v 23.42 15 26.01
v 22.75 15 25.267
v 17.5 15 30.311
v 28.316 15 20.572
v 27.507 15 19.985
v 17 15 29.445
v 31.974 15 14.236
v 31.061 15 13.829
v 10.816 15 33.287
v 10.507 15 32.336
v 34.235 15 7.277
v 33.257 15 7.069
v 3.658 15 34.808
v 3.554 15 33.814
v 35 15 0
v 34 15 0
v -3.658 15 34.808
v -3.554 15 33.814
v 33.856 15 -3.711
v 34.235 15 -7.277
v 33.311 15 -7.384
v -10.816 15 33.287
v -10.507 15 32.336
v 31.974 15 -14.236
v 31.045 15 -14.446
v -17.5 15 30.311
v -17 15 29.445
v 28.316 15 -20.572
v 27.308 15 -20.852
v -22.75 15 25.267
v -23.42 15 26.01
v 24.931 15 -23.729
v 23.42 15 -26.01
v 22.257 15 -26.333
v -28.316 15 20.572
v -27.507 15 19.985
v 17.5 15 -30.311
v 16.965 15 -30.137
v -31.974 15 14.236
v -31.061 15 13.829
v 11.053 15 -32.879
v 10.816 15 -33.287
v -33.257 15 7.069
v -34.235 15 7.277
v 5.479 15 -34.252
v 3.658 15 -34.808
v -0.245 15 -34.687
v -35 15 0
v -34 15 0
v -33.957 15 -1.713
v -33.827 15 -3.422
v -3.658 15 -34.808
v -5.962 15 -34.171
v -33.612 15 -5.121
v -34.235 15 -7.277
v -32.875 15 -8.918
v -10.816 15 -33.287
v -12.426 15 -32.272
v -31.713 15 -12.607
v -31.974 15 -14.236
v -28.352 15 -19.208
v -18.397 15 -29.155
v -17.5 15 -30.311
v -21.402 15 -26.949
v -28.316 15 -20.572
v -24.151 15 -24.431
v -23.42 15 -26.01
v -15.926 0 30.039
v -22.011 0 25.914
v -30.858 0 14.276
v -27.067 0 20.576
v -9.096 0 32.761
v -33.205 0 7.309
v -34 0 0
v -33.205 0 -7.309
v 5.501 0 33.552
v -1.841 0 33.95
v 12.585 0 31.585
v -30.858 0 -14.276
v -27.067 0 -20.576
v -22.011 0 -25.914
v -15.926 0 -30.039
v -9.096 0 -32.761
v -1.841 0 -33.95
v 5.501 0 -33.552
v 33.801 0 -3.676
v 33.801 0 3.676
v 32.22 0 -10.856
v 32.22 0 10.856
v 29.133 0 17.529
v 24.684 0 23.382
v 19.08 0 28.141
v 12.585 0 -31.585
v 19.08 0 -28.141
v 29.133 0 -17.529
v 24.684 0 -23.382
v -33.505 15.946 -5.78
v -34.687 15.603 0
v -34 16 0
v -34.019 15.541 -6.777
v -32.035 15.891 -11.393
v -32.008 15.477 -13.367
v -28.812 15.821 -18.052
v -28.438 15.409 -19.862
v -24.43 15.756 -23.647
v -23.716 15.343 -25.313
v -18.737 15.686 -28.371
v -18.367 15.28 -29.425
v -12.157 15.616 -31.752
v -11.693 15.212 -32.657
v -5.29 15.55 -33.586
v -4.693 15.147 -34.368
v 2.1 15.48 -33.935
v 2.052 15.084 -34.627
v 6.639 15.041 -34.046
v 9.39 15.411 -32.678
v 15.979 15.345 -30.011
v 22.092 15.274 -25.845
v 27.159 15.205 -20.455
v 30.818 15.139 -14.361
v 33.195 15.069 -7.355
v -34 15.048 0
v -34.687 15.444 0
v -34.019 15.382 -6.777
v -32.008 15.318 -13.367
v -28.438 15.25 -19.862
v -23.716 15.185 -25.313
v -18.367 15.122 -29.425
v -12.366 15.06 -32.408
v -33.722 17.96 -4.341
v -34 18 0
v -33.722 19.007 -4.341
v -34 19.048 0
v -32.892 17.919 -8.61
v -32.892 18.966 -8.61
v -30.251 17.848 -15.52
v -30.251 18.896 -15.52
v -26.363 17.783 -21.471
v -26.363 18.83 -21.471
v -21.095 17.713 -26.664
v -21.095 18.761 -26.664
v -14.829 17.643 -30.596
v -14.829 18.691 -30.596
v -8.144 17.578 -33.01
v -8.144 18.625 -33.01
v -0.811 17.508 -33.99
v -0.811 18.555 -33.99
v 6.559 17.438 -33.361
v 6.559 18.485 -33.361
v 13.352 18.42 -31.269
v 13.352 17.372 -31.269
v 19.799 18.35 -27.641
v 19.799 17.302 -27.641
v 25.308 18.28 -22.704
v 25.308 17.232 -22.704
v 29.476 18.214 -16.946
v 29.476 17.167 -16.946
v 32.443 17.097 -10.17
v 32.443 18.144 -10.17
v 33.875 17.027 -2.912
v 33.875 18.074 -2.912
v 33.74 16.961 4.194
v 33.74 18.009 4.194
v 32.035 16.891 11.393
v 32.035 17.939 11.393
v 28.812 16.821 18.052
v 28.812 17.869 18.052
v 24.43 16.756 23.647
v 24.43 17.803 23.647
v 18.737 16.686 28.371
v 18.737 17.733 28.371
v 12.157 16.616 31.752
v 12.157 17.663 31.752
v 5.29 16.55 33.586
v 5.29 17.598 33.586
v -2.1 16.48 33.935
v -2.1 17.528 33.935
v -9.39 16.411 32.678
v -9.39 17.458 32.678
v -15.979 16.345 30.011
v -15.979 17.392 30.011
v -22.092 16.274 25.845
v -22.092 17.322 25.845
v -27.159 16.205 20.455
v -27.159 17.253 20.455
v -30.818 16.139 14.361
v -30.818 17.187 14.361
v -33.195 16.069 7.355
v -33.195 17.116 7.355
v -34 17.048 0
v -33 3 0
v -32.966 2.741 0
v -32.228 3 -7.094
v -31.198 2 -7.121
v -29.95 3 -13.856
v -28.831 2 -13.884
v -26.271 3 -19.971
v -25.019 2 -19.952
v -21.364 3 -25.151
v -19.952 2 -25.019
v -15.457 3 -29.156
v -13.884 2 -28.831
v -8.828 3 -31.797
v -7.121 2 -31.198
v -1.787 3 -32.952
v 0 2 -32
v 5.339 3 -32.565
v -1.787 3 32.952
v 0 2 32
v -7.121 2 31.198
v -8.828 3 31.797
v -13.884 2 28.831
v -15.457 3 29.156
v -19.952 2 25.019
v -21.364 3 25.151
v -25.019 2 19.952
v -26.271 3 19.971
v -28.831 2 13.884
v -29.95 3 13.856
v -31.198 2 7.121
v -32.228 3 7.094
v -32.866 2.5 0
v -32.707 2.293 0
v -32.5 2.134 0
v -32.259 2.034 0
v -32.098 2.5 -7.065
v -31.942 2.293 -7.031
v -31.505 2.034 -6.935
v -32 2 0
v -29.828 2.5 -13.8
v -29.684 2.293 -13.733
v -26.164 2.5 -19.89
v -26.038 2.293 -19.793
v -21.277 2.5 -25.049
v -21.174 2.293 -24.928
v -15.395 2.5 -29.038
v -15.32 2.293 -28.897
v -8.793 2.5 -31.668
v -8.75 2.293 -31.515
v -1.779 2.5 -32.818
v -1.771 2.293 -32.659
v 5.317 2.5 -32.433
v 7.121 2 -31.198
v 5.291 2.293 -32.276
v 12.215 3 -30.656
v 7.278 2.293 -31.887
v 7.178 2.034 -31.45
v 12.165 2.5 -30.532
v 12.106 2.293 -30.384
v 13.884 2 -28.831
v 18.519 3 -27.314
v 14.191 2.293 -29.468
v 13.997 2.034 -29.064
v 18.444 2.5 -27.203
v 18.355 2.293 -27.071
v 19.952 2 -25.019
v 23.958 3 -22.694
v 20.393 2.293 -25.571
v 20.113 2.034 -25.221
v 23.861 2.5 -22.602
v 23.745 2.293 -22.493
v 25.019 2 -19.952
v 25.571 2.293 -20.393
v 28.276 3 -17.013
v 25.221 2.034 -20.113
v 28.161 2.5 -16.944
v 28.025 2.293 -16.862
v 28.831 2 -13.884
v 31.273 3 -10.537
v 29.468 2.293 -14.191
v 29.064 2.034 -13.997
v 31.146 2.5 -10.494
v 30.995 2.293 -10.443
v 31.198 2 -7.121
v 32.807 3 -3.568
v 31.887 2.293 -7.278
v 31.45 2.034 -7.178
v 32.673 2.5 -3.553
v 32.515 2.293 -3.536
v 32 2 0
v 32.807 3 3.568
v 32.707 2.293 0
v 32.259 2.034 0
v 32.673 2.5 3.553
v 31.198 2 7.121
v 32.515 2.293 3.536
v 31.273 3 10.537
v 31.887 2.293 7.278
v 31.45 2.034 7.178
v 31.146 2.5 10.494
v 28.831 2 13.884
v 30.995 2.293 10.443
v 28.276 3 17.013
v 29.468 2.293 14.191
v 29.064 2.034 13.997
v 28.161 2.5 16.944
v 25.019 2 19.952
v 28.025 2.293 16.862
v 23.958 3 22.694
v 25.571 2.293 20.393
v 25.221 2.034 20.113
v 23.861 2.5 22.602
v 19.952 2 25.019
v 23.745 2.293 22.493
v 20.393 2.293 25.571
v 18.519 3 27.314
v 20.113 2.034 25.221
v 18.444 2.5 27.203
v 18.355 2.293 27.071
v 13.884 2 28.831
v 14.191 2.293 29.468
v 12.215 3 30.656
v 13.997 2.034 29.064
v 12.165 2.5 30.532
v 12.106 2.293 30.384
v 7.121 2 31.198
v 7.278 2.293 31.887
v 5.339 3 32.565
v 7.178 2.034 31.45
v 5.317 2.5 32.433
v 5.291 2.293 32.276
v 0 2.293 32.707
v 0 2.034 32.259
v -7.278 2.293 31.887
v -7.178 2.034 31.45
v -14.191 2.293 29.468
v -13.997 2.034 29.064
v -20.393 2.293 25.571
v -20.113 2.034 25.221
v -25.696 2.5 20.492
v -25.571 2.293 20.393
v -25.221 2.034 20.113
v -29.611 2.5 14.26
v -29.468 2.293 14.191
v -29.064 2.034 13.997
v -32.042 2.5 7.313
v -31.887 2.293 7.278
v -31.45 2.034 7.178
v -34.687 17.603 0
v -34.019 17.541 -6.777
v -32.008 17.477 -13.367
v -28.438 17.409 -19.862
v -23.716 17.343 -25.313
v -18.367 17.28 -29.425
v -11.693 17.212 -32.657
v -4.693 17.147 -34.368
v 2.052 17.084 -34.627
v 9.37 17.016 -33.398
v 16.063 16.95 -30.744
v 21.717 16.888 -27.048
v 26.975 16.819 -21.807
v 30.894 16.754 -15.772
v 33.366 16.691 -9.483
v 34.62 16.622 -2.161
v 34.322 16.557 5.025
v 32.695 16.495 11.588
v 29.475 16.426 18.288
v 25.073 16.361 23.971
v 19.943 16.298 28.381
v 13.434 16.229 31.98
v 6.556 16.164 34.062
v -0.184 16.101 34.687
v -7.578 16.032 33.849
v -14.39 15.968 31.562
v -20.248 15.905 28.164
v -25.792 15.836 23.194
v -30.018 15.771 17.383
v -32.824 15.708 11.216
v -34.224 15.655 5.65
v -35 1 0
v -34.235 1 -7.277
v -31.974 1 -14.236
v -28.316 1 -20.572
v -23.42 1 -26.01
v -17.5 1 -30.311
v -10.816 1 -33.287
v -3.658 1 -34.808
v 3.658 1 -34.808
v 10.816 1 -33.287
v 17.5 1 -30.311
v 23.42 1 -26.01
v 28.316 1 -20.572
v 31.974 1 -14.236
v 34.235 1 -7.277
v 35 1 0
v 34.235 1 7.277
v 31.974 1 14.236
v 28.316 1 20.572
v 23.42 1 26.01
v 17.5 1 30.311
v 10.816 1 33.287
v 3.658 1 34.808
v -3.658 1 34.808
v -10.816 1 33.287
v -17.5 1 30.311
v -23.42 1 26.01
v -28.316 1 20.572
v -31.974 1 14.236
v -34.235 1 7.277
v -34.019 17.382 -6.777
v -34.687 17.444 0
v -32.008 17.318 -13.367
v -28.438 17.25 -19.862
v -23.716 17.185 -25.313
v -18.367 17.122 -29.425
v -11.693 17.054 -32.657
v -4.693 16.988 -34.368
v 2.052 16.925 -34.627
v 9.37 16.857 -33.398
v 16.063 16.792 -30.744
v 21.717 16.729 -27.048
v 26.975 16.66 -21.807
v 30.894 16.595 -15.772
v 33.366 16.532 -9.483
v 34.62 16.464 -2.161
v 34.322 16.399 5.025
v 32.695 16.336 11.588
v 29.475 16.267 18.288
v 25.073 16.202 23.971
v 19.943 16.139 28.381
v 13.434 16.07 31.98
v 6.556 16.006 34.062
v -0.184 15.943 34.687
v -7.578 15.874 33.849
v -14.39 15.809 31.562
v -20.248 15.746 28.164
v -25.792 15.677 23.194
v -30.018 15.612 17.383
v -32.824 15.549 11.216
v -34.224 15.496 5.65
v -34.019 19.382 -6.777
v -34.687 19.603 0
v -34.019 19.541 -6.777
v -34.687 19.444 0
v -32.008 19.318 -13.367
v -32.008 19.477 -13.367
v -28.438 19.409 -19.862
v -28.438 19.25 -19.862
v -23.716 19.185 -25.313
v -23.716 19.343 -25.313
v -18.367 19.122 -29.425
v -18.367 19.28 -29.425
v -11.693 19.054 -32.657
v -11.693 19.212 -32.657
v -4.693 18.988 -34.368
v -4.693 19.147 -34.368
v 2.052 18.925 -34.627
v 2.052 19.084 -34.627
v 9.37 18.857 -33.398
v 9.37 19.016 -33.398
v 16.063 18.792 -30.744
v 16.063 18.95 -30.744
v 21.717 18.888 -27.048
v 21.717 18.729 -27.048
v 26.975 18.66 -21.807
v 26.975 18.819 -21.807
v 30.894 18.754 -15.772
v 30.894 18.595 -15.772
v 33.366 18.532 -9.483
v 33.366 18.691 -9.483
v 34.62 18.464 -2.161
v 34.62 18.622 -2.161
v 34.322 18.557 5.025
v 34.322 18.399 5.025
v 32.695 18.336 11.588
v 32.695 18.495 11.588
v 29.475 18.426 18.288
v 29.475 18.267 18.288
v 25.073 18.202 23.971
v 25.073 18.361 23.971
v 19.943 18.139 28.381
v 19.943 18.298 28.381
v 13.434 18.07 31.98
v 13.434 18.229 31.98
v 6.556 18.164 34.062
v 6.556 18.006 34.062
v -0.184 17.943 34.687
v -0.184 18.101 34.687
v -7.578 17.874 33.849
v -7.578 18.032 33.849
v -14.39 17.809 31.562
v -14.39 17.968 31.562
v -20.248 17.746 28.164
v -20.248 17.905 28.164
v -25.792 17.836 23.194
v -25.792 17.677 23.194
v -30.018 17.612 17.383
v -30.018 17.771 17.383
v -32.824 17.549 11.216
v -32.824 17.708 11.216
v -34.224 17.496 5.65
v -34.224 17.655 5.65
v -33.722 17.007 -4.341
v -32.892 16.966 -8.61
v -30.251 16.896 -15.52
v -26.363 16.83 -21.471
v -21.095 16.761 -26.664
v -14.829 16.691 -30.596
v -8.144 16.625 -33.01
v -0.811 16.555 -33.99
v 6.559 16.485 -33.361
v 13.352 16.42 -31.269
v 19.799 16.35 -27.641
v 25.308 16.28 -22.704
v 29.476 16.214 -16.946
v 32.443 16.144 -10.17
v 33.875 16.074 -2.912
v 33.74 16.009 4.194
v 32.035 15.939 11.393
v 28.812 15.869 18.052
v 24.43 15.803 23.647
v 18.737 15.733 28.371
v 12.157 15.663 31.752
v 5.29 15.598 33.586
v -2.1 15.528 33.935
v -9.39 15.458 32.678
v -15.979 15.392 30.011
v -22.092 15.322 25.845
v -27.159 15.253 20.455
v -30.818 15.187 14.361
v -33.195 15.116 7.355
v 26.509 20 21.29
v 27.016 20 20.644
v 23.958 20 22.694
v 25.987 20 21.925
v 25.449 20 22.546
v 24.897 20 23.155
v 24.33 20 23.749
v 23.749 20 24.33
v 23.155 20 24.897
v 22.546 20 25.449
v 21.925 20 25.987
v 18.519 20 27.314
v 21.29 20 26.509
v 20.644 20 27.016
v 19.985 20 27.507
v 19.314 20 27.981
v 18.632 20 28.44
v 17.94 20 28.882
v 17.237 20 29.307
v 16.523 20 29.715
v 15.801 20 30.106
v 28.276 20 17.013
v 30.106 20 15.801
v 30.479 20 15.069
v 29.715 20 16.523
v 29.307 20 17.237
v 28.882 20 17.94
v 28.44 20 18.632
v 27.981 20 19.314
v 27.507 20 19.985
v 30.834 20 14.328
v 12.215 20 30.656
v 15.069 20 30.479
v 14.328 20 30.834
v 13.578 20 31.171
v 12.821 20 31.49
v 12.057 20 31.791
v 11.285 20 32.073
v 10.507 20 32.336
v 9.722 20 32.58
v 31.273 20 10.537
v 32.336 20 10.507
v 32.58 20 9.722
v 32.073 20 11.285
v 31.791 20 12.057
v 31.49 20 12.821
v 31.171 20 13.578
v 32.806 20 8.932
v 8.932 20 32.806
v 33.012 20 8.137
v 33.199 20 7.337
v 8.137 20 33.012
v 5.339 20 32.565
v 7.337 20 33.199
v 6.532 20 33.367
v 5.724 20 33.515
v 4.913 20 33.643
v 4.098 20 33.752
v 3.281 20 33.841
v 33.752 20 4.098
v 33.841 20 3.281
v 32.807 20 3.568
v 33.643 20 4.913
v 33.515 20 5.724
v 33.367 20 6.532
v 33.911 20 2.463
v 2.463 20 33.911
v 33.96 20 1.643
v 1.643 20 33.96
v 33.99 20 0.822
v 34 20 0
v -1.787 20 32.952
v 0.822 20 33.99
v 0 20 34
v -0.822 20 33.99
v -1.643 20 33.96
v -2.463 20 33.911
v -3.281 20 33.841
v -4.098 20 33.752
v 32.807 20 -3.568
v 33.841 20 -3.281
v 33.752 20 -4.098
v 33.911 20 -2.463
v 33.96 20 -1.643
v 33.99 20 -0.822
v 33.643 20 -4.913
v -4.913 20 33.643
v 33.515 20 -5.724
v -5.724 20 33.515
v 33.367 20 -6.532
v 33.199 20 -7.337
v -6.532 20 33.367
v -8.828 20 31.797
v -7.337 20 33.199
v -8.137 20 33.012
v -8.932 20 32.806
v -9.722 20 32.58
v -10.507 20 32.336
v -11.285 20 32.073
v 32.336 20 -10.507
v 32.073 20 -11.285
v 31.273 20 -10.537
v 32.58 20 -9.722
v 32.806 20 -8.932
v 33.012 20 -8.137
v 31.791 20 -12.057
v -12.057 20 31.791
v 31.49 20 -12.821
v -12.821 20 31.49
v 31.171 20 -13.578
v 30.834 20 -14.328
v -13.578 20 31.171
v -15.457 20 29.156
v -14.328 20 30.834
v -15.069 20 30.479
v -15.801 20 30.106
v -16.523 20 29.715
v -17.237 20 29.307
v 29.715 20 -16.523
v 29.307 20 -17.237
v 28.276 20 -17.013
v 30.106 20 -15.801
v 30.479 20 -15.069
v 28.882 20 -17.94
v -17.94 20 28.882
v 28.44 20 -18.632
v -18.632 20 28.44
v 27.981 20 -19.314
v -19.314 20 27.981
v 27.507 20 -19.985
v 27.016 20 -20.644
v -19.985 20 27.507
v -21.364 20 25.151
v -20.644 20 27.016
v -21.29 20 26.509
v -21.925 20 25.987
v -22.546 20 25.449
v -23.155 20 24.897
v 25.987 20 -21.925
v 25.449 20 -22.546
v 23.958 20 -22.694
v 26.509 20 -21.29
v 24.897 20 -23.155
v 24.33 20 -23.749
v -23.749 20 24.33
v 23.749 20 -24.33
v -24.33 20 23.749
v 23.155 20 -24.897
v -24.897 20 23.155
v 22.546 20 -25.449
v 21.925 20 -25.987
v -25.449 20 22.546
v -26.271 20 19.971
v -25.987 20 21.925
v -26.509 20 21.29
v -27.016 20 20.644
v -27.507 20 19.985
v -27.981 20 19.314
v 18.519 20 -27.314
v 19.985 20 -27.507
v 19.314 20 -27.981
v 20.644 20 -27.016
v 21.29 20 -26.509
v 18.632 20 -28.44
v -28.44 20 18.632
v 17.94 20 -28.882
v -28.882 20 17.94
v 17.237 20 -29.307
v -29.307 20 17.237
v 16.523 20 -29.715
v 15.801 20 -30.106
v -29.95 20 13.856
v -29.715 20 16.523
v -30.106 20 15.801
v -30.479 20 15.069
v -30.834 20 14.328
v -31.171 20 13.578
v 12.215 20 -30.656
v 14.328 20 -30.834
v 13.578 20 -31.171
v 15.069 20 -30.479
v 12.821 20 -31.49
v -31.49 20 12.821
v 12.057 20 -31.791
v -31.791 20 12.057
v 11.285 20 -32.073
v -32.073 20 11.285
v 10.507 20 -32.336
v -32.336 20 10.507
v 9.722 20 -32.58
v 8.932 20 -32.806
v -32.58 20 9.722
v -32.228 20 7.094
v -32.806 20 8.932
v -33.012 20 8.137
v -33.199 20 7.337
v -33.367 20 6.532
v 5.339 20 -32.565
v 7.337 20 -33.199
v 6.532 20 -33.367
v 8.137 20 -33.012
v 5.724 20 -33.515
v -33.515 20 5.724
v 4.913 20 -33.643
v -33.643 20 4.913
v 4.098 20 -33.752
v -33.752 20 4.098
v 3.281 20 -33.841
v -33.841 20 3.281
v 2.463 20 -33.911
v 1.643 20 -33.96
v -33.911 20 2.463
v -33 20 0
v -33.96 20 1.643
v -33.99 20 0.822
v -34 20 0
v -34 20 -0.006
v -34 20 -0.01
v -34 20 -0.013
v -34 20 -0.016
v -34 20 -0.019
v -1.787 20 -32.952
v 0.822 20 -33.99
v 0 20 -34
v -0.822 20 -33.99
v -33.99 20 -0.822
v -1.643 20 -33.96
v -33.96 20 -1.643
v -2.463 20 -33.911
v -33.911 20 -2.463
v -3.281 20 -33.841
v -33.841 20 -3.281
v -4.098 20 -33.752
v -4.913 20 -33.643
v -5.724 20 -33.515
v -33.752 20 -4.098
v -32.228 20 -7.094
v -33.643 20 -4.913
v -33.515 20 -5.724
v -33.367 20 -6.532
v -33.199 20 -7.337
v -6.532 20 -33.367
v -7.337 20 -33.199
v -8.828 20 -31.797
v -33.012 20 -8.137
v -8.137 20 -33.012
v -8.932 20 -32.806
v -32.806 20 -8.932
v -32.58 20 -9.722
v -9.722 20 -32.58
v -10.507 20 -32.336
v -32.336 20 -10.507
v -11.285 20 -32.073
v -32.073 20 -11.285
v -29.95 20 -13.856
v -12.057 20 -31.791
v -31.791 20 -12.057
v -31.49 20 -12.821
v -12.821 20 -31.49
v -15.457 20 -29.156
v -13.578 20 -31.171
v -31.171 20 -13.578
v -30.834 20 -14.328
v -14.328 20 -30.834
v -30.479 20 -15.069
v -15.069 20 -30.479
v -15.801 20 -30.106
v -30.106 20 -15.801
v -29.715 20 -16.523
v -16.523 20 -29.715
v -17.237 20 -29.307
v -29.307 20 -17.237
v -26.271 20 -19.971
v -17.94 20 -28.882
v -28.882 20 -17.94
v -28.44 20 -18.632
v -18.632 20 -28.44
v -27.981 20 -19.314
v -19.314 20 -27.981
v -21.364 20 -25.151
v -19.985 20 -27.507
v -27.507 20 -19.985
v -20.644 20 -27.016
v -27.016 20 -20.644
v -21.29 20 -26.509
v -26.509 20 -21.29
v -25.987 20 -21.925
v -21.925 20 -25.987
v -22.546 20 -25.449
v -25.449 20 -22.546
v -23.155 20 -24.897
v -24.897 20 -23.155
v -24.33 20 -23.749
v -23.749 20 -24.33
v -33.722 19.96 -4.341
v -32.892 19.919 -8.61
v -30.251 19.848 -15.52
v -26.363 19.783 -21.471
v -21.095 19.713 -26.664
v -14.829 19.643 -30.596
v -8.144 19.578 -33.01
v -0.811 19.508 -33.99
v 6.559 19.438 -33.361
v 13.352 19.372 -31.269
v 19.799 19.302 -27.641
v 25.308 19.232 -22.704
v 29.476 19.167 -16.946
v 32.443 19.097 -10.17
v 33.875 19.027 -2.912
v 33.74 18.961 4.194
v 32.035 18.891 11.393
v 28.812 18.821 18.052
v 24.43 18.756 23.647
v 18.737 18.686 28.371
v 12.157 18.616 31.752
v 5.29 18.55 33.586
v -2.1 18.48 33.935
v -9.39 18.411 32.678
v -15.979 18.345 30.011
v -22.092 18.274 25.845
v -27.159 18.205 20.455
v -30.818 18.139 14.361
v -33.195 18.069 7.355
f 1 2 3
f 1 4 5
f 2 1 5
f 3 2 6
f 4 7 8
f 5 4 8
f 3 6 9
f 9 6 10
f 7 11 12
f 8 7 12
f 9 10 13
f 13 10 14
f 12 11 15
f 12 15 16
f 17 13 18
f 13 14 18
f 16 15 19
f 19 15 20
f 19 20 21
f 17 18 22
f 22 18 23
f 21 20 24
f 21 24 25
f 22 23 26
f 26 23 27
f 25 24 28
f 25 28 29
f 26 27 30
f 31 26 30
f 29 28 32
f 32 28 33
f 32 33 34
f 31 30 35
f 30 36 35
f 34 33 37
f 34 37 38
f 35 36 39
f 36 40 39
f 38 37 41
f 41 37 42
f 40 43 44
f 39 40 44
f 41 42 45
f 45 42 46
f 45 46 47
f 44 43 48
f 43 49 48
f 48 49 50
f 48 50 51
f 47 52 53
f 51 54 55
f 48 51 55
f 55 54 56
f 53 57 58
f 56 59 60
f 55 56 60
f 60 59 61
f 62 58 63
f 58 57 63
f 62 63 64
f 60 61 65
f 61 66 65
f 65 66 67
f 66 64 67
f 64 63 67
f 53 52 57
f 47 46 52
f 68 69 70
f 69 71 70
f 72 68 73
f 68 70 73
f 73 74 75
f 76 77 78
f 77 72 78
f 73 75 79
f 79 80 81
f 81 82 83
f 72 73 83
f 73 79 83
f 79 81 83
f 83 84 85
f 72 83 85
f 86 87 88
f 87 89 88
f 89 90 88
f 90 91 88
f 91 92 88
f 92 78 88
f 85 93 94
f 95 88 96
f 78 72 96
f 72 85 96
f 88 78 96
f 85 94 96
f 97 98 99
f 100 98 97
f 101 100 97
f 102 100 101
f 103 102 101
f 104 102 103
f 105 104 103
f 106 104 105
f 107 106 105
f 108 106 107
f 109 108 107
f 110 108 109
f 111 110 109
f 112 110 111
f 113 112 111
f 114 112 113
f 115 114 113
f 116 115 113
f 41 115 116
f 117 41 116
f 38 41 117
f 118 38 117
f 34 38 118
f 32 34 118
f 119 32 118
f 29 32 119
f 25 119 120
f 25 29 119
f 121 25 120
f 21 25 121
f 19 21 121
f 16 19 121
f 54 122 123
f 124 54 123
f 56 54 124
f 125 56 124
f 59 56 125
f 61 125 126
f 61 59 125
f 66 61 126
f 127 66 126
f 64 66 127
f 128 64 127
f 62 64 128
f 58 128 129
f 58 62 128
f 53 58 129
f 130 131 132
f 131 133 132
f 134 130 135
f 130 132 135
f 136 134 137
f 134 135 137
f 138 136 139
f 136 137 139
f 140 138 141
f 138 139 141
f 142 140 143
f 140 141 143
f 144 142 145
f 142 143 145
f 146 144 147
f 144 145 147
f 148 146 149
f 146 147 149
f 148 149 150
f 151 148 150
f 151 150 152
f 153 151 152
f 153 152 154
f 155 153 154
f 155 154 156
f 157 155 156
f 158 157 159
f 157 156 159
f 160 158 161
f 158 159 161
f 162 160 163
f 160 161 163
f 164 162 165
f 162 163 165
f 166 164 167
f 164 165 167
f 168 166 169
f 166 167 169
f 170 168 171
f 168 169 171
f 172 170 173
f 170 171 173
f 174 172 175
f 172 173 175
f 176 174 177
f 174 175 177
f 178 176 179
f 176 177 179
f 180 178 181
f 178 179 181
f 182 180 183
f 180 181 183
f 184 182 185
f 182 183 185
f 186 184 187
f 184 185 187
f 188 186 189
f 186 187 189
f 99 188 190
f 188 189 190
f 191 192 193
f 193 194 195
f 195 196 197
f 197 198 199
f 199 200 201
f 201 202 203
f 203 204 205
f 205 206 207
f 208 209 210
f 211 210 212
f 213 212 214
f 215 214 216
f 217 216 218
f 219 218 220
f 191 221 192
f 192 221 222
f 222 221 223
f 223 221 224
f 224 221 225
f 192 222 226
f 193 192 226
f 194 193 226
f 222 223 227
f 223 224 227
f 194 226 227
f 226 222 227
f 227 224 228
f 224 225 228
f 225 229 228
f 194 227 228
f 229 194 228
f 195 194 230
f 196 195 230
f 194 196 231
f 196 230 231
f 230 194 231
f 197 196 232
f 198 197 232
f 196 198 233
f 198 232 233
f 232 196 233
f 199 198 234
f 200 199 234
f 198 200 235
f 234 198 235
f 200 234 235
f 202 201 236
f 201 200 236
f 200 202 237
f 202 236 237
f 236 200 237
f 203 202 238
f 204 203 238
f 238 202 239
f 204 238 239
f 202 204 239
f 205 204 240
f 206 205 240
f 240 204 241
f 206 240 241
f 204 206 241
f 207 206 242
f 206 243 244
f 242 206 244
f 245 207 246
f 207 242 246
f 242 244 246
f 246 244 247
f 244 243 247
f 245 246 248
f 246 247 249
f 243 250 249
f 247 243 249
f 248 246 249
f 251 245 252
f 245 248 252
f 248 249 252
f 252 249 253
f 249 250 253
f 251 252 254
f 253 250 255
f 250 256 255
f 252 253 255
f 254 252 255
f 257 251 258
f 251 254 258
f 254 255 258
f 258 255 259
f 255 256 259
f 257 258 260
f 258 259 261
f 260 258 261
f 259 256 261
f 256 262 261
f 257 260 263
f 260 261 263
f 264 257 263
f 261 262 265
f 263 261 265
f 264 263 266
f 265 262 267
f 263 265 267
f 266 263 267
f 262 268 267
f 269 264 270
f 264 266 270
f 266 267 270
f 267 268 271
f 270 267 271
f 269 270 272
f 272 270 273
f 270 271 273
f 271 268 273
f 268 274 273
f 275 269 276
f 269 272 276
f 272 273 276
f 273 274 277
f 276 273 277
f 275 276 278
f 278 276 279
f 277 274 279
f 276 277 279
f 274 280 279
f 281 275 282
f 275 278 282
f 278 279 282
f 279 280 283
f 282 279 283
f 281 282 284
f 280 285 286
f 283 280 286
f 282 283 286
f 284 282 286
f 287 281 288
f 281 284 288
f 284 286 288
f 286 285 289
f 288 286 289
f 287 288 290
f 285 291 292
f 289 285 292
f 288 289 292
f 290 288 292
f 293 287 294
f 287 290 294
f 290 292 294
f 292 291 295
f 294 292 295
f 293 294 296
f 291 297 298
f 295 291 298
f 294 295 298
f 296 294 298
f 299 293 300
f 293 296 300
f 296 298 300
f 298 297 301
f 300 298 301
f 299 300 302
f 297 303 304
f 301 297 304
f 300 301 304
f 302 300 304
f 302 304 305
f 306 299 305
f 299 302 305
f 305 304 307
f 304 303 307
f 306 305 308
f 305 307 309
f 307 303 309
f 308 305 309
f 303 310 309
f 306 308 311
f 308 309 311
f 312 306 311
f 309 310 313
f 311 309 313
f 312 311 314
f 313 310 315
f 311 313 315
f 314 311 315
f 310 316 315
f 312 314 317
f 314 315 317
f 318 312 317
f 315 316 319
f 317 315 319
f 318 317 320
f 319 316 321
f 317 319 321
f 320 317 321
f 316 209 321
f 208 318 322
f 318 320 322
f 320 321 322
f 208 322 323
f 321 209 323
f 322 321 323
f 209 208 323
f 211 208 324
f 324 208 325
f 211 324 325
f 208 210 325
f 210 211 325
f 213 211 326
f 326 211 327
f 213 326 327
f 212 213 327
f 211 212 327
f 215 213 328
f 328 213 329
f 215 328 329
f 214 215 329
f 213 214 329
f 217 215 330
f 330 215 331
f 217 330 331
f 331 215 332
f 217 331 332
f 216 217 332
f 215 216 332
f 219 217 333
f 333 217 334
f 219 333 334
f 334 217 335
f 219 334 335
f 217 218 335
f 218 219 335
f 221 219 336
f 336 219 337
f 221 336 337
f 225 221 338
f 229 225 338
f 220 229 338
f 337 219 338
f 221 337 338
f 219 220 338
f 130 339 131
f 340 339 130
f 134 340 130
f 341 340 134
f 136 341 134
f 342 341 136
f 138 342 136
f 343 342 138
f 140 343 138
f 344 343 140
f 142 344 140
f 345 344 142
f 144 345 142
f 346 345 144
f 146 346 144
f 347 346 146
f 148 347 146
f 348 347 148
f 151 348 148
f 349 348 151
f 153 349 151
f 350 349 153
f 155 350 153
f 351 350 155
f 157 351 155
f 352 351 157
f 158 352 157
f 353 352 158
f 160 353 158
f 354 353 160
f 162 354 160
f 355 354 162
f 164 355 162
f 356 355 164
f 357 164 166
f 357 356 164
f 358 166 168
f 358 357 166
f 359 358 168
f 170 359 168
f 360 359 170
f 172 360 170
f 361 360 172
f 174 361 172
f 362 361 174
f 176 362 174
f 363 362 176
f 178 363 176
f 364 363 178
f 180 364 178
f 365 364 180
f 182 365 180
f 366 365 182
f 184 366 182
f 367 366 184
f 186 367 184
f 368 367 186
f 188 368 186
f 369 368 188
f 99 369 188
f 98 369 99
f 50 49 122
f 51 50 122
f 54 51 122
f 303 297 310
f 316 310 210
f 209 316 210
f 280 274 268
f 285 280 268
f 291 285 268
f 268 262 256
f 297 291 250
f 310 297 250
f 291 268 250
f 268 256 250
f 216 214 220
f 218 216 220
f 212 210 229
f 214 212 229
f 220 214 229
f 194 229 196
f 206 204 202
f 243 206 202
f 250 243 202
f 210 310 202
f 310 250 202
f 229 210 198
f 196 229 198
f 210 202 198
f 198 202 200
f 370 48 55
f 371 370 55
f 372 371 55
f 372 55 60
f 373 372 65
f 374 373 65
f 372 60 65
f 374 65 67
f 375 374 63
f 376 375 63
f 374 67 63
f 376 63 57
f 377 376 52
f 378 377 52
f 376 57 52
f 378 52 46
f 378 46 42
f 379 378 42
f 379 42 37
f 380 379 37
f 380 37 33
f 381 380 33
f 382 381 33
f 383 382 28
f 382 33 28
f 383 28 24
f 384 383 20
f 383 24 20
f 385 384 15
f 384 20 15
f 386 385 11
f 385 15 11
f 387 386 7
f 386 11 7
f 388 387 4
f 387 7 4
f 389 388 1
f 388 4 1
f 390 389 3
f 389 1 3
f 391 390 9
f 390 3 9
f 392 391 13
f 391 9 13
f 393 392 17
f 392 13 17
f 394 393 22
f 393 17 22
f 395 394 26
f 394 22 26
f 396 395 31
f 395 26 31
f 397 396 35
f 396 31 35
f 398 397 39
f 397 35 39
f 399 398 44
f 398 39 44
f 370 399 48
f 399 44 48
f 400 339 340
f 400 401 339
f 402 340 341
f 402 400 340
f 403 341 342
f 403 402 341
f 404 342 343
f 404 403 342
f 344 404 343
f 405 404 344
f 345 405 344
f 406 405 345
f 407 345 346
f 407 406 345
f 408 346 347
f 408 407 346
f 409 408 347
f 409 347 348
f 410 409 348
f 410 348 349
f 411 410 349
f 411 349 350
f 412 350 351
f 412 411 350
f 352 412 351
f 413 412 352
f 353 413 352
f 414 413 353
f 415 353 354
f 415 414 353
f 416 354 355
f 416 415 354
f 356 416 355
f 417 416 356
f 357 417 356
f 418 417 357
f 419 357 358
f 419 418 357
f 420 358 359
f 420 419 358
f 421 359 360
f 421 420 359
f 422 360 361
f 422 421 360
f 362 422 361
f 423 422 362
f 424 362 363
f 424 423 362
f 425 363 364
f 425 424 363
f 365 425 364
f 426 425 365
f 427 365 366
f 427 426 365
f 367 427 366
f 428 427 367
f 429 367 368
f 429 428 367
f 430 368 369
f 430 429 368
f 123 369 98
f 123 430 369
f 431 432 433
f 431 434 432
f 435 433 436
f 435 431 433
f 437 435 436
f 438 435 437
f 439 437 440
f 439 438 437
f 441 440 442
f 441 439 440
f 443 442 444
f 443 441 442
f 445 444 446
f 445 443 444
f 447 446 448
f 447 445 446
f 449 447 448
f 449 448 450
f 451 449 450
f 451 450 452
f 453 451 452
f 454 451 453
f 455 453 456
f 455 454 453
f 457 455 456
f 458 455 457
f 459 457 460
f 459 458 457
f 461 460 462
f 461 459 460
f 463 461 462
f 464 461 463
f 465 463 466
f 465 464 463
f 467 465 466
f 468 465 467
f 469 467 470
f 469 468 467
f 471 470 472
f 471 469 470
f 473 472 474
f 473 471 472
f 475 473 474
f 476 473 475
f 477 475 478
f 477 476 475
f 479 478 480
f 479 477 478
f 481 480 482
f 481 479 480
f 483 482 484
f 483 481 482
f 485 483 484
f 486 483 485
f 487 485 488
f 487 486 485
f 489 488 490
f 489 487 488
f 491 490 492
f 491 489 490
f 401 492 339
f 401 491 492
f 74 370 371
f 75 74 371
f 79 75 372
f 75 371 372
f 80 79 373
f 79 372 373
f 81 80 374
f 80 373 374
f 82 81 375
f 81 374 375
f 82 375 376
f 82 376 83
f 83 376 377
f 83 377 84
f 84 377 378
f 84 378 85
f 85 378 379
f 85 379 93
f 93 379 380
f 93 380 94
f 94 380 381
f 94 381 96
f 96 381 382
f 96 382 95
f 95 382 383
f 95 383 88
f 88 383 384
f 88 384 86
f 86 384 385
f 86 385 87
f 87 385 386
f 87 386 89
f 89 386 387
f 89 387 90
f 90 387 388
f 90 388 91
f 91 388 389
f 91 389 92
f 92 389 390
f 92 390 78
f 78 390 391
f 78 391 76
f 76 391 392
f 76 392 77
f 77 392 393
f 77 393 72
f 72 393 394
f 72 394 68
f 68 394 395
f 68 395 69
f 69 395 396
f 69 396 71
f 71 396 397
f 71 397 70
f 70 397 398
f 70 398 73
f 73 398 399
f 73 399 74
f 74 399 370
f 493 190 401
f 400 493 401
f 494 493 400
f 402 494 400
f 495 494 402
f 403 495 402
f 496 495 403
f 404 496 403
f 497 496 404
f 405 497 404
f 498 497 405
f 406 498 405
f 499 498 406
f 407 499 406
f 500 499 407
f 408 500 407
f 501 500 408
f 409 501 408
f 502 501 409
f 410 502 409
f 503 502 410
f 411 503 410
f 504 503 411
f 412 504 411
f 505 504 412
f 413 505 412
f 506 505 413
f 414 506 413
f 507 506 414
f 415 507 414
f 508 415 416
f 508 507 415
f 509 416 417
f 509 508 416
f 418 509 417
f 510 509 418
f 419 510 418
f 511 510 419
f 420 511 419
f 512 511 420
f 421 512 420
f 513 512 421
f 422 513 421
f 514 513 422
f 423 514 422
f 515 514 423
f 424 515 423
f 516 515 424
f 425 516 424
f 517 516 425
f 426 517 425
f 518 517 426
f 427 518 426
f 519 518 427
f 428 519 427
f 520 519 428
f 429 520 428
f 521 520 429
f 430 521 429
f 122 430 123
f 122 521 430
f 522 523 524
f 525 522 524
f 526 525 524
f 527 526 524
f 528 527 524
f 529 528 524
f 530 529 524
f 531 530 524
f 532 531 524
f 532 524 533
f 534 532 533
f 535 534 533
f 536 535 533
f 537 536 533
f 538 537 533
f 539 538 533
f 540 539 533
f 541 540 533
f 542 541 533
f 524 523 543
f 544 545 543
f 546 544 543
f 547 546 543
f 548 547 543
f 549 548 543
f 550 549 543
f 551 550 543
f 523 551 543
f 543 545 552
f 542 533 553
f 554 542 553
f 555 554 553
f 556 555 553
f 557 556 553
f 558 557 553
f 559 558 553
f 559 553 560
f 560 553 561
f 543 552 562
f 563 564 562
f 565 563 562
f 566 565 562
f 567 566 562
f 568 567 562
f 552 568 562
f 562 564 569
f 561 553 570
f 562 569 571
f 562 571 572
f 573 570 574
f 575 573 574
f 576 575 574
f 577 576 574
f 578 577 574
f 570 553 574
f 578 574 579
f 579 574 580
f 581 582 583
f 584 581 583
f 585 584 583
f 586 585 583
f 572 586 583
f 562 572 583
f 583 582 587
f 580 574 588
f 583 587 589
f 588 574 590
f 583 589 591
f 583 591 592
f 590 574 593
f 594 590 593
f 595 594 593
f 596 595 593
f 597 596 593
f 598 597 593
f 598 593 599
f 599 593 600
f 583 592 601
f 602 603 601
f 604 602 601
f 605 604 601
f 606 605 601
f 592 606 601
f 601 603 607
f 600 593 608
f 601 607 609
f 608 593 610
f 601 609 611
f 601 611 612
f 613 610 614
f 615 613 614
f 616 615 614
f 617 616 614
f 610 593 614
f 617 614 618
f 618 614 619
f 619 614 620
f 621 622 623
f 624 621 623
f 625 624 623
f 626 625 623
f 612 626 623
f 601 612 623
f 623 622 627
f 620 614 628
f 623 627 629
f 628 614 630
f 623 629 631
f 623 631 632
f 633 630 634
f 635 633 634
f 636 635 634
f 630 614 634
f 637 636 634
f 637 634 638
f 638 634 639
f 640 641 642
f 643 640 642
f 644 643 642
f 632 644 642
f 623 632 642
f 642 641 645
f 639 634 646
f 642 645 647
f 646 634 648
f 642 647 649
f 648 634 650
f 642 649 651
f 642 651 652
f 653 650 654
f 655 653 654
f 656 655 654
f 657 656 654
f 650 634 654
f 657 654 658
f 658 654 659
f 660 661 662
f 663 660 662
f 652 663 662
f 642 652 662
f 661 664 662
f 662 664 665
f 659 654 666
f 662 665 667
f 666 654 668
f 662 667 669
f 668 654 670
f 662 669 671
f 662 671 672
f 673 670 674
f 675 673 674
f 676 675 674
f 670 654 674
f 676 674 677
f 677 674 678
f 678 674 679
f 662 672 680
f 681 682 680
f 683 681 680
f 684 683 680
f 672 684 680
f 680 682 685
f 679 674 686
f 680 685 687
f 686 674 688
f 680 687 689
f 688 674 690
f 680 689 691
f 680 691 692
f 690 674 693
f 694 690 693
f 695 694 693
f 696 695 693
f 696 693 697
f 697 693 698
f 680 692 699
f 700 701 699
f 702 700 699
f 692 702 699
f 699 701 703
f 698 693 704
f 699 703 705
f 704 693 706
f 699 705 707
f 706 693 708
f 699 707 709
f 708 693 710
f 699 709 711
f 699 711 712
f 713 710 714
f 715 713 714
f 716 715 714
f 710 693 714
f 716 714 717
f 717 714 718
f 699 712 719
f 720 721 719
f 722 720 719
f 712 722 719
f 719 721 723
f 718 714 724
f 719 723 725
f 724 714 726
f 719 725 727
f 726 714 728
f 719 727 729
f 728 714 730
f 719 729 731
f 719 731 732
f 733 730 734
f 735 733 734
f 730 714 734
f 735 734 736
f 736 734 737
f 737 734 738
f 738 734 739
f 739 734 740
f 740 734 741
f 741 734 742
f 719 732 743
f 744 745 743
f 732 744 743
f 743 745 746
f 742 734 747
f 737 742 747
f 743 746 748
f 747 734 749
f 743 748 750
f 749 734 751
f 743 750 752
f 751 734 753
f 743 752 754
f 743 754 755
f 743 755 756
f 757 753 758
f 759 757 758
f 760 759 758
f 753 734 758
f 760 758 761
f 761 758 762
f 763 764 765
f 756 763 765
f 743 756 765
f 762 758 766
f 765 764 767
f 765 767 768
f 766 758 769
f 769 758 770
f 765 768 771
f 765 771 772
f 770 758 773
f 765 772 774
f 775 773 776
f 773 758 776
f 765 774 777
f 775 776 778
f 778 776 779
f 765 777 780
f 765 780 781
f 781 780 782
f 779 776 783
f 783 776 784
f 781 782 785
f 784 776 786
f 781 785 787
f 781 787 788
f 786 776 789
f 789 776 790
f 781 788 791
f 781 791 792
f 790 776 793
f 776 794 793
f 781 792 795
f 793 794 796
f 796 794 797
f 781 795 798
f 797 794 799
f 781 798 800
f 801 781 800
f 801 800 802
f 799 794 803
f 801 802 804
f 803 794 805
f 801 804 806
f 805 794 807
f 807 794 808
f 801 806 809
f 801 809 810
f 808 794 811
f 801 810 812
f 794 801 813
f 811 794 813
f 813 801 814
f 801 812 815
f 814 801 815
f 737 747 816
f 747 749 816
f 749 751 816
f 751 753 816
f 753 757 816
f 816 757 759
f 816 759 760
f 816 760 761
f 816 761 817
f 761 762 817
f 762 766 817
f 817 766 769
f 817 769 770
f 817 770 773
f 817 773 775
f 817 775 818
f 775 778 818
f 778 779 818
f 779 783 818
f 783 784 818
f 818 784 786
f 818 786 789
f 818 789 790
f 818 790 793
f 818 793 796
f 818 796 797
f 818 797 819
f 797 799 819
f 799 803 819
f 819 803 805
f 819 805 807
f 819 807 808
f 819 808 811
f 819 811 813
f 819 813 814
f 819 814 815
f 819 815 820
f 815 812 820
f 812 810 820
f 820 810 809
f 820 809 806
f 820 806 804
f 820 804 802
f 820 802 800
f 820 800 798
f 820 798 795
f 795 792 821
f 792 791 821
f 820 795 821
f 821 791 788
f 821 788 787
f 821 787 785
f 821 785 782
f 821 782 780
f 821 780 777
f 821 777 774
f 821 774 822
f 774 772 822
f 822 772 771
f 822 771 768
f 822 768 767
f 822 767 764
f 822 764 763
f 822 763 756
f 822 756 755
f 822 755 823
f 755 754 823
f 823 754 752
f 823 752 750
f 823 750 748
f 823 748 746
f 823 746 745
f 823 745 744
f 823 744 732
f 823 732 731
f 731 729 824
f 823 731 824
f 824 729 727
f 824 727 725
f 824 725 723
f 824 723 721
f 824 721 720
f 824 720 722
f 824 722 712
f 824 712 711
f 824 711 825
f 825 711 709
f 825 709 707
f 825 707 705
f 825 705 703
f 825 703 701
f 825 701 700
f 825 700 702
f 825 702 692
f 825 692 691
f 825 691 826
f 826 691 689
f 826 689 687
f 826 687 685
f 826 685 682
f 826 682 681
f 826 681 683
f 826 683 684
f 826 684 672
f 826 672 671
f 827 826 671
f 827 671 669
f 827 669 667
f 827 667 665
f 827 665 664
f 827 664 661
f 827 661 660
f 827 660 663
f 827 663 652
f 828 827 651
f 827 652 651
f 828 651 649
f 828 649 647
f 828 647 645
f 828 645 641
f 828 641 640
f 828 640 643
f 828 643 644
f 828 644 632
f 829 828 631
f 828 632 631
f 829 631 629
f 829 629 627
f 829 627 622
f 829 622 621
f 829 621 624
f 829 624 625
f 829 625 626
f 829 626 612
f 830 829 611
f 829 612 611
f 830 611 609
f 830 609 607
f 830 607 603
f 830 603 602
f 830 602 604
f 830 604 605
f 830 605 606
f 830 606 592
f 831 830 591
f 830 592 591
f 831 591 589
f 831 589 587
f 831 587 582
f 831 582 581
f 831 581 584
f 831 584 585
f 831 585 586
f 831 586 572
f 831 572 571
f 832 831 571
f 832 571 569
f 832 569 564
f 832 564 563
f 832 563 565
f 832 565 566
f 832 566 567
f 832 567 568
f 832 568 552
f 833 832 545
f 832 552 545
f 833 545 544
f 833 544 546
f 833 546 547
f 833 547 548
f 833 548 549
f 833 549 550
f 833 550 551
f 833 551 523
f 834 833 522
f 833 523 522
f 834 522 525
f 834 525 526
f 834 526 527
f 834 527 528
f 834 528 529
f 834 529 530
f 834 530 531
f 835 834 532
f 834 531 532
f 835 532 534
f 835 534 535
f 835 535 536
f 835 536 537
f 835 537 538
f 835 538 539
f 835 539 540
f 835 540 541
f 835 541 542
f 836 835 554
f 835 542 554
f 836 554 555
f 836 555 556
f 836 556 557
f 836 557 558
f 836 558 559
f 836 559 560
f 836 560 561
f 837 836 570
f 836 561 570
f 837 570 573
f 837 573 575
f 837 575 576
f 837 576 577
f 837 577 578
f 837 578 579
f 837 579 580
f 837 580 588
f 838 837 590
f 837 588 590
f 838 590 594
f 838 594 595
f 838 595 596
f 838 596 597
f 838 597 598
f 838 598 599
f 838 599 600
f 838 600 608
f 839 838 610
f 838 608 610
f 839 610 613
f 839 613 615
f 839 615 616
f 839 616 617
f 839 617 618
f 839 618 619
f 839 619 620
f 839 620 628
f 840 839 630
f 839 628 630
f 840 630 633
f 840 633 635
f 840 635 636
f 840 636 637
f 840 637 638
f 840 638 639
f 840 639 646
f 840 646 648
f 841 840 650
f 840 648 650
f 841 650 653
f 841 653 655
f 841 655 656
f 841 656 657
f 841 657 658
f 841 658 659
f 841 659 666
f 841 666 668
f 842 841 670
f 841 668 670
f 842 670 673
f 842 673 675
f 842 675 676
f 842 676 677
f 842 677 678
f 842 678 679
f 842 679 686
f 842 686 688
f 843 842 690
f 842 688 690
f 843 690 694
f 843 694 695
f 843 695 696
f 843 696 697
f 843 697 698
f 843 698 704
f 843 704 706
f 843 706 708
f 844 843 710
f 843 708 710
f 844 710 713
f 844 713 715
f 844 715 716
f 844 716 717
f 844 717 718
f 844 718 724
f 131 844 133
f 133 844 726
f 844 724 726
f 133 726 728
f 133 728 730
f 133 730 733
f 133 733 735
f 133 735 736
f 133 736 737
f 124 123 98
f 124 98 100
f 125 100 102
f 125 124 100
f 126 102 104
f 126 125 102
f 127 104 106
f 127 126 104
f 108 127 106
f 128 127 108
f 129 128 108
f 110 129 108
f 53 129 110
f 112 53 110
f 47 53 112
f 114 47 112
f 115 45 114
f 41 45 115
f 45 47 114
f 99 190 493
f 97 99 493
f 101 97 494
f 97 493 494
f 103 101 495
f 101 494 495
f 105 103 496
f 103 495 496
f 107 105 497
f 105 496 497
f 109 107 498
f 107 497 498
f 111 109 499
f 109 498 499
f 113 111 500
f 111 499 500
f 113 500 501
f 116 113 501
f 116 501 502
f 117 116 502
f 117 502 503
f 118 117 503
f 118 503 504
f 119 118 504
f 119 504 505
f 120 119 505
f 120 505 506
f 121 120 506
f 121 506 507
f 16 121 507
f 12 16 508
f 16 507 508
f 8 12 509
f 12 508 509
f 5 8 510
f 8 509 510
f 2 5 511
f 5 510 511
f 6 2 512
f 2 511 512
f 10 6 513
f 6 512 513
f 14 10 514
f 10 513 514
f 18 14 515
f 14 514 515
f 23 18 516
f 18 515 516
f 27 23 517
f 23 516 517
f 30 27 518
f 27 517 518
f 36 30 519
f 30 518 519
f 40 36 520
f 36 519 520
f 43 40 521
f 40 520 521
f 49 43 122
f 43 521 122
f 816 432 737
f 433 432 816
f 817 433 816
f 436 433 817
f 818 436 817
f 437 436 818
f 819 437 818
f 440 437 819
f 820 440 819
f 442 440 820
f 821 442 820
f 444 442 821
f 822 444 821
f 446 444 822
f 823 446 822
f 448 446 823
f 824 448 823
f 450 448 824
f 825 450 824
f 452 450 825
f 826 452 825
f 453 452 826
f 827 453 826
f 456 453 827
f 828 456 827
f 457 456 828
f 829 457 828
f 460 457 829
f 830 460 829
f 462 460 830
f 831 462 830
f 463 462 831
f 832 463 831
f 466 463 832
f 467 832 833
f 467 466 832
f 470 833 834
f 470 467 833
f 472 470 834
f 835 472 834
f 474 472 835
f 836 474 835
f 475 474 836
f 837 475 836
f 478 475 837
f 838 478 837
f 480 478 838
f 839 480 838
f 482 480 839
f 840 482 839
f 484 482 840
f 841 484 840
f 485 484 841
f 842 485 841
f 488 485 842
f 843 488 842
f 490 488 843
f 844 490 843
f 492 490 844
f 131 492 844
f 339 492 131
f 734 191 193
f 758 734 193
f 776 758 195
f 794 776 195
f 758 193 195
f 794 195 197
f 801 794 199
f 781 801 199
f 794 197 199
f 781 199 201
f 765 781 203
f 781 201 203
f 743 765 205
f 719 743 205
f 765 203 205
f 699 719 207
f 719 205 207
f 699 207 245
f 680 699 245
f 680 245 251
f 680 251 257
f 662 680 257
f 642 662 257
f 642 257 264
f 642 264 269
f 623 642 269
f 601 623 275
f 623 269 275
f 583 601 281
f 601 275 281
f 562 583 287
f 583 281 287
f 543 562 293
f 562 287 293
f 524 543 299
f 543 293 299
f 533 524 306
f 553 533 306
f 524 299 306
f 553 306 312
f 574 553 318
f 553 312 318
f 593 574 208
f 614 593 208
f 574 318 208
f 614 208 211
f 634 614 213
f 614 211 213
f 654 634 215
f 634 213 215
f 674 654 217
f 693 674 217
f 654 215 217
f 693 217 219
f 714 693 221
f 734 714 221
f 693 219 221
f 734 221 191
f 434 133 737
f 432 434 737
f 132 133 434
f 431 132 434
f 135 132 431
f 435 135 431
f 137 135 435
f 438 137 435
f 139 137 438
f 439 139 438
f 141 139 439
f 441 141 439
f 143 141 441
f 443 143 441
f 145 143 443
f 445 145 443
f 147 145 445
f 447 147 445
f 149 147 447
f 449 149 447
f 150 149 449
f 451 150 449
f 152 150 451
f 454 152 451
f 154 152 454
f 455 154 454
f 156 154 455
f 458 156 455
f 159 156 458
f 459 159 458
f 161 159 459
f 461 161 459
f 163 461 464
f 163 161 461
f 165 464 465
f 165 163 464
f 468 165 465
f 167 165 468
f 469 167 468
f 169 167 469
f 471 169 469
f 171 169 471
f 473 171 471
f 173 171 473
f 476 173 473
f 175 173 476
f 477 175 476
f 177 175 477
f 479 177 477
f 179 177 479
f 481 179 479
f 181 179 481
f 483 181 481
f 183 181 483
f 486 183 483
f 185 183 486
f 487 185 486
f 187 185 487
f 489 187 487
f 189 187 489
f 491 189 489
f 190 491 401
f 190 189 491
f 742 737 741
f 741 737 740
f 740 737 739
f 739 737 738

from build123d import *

# Parameters (mm, degrees)
CHAMFER_1_SIZE = 1
THREAD_1_PITCH = 2
FILLET_1_R     = 1


with BuildPart() as part:
    # Sketch 1 → Повернуть1 (revolve)
    with BuildSketch(Plane.XY):
        Polygon((0, 0), (-35, 0), (-35, 15), (-34, 15), (-34, 20), (-33, 20), (-33, 2), (0, 2), align=None)
    revolve(axis=Axis((0, 2, 0), (0, -1, 0)))

    # Фаска1
    chamfer_1_edges = [part.edges().sort_by_distance(p)[0] for p in [
        (35, 0, 0),
    ]]
    chamfer(chamfer_1_edges, length=CHAMFER_1_SIZE)

    # Резьба1: the profile of Sketch 1 2 profile screwed along a right-hand helix of 2.5 turns, 10 arcs to a turn; built about Z, then put on its axis
    thread_1_z = Axis((0, 0, 0), (0, 0, 1))
    thread_1_corners = [(33.9997, 0, -0.000173205), (34.687407661, 0, 0.396874998), (34.687407661, 0, 0.555624998), (33.9997, 0, 0.952673202)]
    with BuildLine(mode=Mode.PRIVATE) as thread_1_profile:
        Line(thread_1_corners[0], thread_1_corners[1])
        Line(thread_1_corners[1], thread_1_corners[2])
        Line(thread_1_corners[2], thread_1_corners[3])
        Line(thread_1_corners[3], thread_1_corners[0])
    thread_1_cap = Face(thread_1_profile.wire())
    thread_1_turn_angles = [0, 18, 36, 54, 72, 90, 108, 126, 144, 162, 180, 198, 216, 234, 252, 270, 288, 306, 324, 342, 360]
    thread_1_turn_weights = [1, 0.9510565162951535, 1, 0.9510565162951535, 1, 0.9510565162951535, 1, 0.9510565162951535, 1, 0.9510565162951535, 1, 0.9510565162951535, 1, 0.9510565162951535, 1, 0.9510565162951535, 1, 0.9510565162951535, 1, 0.9510565162951535, 1]
    thread_1_turn_rails = [Edge.make_bspline([Vector(p[0], p[1], 0).rotate(thread_1_z, thread_1_turn_angles[k]) / thread_1_turn_weights[k] + Vector(0, 0, p[2] + THREAD_1_PITCH * thread_1_turn_angles[k] / 360) for k in range(21)], [0, 0, 0, 1, 1, 2, 2, 3, 3, 4, 4, 5, 5, 6, 6, 7, 7, 8, 8, 9, 9, 10, 10, 10], 2, thread_1_turn_weights) for p in thread_1_corners]
    thread_1_turn_sides = [Face.make_surface_from_curves(thread_1_turn_rails[p[0]], thread_1_turn_rails[p[1]]) for p in [(0, 1), (1, 2), (2, 3), (3, 0)]]
    thread_1_last_angles = [720, 738, 756, 774, 792, 810, 828, 846, 864, 882, 900]
    thread_1_last_weights = [1, 0.9510565162951535, 1, 0.9510565162951535, 1, 0.9510565162951535, 1, 0.9510565162951535, 1, 0.9510565162951535, 1]
    thread_1_last_rails = [Edge.make_bspline([Vector(p[0], p[1], 0).rotate(thread_1_z, thread_1_last_angles[k]) / thread_1_last_weights[k] + Vector(0, 0, p[2] + THREAD_1_PITCH * thread_1_last_angles[k] / 360) for k in range(11)], [0, 0, 0, 1, 1, 2, 2, 3, 3, 4, 4, 5, 5, 5], 2, thread_1_last_weights) for p in thread_1_corners]
    thread_1_last_sides = [Face.make_surface_from_curves(thread_1_last_rails[p[0]], thread_1_last_rails[p[1]]) for p in [(0, 1), (1, 2), (2, 3), (3, 0)]]
    thread_1 = Plane(origin=(0, 20, 0), x_dir=(-1, 0, 0), z_dir=(0, -1, 0)) * Solid(Shell([*[p.moved(Location((0, 0, THREAD_1_PITCH * i))) for i in range(2) for p in thread_1_turn_sides], *thread_1_last_sides, thread_1_cap, thread_1_cap.rotate(thread_1_z, 900).moved(Location((0, 0, THREAD_1_PITCH * 900 / 360)))]))
    add(thread_1)

    # Скругление1
    fillet_1_edges = [part.edges().sort_by_distance(p)[0] for p in [
        (33, 2, 0),
    ]]
    fillet(fillet_1_edges, radius=FILLET_1_R)


solid = part.part
